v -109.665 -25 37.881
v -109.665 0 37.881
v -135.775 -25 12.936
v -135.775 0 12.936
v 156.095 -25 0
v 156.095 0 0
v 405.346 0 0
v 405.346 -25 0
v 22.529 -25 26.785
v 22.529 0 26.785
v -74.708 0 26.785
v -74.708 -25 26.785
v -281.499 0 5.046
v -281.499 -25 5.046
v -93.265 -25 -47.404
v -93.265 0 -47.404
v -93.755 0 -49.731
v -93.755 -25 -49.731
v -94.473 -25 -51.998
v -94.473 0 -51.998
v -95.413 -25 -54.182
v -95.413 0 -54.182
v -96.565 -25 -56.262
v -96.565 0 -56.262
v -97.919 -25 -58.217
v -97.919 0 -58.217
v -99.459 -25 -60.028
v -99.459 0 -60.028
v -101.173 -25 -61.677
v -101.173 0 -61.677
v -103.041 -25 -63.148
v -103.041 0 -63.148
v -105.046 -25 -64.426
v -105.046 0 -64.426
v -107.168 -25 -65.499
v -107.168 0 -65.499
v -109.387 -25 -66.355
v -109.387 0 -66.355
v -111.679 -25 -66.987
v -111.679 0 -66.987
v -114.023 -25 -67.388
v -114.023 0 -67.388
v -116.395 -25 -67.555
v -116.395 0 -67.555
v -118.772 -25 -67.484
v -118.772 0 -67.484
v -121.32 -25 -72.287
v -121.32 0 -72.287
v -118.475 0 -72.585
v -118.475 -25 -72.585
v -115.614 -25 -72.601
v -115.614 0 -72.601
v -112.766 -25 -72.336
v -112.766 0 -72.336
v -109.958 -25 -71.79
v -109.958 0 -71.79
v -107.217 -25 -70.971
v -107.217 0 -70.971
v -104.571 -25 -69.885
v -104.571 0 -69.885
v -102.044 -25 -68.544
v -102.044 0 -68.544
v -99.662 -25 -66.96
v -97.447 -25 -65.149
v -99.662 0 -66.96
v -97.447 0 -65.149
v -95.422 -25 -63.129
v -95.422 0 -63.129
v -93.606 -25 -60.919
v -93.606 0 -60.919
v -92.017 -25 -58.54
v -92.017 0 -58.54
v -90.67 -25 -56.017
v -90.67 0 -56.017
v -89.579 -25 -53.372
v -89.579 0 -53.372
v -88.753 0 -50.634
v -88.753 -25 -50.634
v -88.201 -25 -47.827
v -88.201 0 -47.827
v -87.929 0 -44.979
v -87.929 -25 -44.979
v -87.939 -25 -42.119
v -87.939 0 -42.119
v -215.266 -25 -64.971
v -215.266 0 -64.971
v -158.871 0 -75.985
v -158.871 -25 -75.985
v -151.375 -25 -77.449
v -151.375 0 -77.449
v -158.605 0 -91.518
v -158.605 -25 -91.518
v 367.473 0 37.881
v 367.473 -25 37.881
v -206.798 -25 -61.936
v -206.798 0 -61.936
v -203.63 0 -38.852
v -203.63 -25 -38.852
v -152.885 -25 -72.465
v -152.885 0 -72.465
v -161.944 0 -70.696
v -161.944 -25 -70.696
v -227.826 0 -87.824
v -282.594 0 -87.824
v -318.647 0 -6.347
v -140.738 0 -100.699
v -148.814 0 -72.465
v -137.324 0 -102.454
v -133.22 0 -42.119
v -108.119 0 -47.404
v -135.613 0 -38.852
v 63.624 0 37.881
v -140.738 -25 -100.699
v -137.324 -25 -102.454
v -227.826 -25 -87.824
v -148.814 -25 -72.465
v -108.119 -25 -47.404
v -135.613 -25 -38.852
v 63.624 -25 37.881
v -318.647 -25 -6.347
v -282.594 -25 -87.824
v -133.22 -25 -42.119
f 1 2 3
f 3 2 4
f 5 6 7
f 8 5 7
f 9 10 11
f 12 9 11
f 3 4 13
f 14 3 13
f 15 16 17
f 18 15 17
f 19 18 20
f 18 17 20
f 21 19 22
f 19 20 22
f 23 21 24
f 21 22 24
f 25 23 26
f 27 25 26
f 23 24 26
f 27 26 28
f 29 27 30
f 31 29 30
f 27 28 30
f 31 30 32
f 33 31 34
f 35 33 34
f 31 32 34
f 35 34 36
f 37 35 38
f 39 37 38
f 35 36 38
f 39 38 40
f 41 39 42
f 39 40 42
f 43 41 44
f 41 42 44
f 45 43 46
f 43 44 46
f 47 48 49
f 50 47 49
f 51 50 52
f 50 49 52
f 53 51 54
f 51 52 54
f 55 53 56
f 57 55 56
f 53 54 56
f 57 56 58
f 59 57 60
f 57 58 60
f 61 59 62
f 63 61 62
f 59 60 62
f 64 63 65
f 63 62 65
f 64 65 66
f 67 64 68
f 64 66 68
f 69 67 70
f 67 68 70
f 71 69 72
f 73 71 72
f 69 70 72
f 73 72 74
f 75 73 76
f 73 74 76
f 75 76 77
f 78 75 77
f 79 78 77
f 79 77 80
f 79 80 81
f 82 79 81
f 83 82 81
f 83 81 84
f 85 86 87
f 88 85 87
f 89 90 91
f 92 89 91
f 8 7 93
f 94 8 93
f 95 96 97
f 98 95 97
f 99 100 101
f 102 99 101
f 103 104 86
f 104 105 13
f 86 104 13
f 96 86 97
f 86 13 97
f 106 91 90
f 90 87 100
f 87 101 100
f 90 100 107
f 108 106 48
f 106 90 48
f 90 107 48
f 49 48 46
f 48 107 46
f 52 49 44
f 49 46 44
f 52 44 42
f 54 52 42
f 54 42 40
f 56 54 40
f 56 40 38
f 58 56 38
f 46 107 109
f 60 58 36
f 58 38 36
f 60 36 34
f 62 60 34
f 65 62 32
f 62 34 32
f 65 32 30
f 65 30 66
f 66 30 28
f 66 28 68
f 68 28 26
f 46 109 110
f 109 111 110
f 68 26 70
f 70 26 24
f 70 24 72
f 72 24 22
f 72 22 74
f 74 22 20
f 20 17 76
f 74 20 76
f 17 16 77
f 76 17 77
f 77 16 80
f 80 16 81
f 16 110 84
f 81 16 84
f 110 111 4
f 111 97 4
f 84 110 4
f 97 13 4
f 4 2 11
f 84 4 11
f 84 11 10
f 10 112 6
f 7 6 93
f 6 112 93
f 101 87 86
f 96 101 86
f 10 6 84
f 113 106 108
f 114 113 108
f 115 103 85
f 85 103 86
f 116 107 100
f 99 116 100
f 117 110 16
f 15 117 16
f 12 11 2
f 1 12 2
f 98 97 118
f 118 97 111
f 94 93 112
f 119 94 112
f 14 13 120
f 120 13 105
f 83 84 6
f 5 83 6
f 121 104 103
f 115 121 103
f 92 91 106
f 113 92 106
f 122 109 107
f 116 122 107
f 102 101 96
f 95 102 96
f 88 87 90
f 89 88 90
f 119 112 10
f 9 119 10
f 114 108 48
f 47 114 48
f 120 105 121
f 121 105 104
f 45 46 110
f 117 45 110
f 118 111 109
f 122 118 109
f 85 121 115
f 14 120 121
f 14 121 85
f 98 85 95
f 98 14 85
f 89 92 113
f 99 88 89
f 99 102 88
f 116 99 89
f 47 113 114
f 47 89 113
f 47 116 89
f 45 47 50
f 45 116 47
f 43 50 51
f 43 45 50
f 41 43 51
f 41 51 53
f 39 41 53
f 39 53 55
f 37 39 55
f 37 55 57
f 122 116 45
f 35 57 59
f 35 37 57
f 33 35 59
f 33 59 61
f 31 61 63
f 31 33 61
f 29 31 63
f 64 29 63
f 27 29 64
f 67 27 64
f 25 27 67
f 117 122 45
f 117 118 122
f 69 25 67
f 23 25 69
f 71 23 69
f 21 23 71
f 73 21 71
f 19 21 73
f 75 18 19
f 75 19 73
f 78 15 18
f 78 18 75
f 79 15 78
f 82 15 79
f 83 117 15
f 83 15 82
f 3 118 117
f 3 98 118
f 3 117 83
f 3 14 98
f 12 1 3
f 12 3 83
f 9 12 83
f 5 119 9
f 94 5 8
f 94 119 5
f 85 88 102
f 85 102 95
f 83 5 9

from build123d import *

# Parameters (mm, degrees)
F1_DEPTH = 25


with BuildPart() as f1:
    # F0 (on Front) → F1 (new body)
    with BuildSketch(Plane.XZ):
        Polygon((367.473159, 37.881499), (63.624065, 37.881499), (22.529194, 26.785146), (-74.708393, 26.785146), (-109.664981, 37.881499), (-135.774802, 12.936393), (-281.499266, 5.046134), (-318.647265, -6.34683), (-282.593813, -87.8235), (-227.826428, -87.8235), (-215.265799, -64.971001), (-211.985035, -42.118501), (-210.623877, -32.637216), (-136.59613, -32.637216), (-128.112047, -32.177844), (-133.220164, -42.118501), (-109.659574, -42.118501), (-93.017144, -42.118501), (-87.93899, -42.118501), (156.094849, 0), (405.345833, 0), align=None)
        Polygon((-122.766047, -66.823296), (-109.659574, -42.118501), (-133.220164, -42.118501), (-148.813925, -72.464758), (-151.375101, -77.448938), (-158.60486, -91.51842), (-140.738134, -100.699436), (-125.198854, -71.408968), align=None)
        with BuildLine():
            ThreePointArc((-121.31966, -72.286692), (-97.447394, -65.149299), (-87.93899, -42.118501))
            Line((-87.93899, -42.118501), (-93.017144, -42.118501))
            ThreePointArc((-93.017144, -42.118501), (-92.994342, -44.768054), (-93.264839, -47.403862))
            ThreePointArc((-93.264839, -47.403862), (-102.08842, -62.436086), (-118.771899, -67.484341))
            ThreePointArc((-118.771899, -67.484341), (-120.782989, -67.238505), (-122.766047, -66.823296))
            Line((-122.766047, -66.823296), (-125.198854, -71.408968))
            ThreePointArc((-125.198854, -71.408968), (-123.274332, -71.914456), (-121.31966, -72.286692))
        make_face()
        with BuildLine():
            ThreePointArc((-93.264839, -47.403862), (-92.994342, -44.768054), (-93.017144, -42.118501))
            Line((-93.017144, -42.118501), (-109.659574, -42.118501))
            Line((-109.659574, -42.118501), (-122.766047, -66.823296))
            ThreePointArc((-122.766047, -66.823296), (-120.782989, -67.238505), (-118.771899, -67.484341))
            Line((-118.771899, -67.484341), (-108.118735, -47.403862))
            Line((-108.118735, -47.403862), (-93.264839, -47.403862))
        make_face()
        Polygon((-135.613307, -38.852425), (-133.220164, -42.118501), (-128.112047, -32.177844), (-136.59613, -32.637216), (-210.623877, -32.637216), (-211.985035, -42.118501), (-215.265799, -64.971001), (-158.870872, -75.985004), (-151.375101, -77.448938), (-148.813925, -72.464758), (-152.885377, -72.464758), (-161.944241, -70.69555), (-206.79819, -61.935515), (-203.630078, -38.852425), (-145.581298, -38.852425), align=None)
        with BuildLine():
            Line((-137.324025, -102.453814), (-121.31966, -72.286692))
            ThreePointArc((-121.31966, -72.286692), (-123.274332, -71.914456), (-125.198854, -71.408968))
            Line((-125.198854, -71.408968), (-140.738134, -100.699436))
            Line((-140.738134, -100.699436), (-137.324025, -102.453814))
        make_face()
    extrude(amount=F1_DEPTH)


solid = f1.part
